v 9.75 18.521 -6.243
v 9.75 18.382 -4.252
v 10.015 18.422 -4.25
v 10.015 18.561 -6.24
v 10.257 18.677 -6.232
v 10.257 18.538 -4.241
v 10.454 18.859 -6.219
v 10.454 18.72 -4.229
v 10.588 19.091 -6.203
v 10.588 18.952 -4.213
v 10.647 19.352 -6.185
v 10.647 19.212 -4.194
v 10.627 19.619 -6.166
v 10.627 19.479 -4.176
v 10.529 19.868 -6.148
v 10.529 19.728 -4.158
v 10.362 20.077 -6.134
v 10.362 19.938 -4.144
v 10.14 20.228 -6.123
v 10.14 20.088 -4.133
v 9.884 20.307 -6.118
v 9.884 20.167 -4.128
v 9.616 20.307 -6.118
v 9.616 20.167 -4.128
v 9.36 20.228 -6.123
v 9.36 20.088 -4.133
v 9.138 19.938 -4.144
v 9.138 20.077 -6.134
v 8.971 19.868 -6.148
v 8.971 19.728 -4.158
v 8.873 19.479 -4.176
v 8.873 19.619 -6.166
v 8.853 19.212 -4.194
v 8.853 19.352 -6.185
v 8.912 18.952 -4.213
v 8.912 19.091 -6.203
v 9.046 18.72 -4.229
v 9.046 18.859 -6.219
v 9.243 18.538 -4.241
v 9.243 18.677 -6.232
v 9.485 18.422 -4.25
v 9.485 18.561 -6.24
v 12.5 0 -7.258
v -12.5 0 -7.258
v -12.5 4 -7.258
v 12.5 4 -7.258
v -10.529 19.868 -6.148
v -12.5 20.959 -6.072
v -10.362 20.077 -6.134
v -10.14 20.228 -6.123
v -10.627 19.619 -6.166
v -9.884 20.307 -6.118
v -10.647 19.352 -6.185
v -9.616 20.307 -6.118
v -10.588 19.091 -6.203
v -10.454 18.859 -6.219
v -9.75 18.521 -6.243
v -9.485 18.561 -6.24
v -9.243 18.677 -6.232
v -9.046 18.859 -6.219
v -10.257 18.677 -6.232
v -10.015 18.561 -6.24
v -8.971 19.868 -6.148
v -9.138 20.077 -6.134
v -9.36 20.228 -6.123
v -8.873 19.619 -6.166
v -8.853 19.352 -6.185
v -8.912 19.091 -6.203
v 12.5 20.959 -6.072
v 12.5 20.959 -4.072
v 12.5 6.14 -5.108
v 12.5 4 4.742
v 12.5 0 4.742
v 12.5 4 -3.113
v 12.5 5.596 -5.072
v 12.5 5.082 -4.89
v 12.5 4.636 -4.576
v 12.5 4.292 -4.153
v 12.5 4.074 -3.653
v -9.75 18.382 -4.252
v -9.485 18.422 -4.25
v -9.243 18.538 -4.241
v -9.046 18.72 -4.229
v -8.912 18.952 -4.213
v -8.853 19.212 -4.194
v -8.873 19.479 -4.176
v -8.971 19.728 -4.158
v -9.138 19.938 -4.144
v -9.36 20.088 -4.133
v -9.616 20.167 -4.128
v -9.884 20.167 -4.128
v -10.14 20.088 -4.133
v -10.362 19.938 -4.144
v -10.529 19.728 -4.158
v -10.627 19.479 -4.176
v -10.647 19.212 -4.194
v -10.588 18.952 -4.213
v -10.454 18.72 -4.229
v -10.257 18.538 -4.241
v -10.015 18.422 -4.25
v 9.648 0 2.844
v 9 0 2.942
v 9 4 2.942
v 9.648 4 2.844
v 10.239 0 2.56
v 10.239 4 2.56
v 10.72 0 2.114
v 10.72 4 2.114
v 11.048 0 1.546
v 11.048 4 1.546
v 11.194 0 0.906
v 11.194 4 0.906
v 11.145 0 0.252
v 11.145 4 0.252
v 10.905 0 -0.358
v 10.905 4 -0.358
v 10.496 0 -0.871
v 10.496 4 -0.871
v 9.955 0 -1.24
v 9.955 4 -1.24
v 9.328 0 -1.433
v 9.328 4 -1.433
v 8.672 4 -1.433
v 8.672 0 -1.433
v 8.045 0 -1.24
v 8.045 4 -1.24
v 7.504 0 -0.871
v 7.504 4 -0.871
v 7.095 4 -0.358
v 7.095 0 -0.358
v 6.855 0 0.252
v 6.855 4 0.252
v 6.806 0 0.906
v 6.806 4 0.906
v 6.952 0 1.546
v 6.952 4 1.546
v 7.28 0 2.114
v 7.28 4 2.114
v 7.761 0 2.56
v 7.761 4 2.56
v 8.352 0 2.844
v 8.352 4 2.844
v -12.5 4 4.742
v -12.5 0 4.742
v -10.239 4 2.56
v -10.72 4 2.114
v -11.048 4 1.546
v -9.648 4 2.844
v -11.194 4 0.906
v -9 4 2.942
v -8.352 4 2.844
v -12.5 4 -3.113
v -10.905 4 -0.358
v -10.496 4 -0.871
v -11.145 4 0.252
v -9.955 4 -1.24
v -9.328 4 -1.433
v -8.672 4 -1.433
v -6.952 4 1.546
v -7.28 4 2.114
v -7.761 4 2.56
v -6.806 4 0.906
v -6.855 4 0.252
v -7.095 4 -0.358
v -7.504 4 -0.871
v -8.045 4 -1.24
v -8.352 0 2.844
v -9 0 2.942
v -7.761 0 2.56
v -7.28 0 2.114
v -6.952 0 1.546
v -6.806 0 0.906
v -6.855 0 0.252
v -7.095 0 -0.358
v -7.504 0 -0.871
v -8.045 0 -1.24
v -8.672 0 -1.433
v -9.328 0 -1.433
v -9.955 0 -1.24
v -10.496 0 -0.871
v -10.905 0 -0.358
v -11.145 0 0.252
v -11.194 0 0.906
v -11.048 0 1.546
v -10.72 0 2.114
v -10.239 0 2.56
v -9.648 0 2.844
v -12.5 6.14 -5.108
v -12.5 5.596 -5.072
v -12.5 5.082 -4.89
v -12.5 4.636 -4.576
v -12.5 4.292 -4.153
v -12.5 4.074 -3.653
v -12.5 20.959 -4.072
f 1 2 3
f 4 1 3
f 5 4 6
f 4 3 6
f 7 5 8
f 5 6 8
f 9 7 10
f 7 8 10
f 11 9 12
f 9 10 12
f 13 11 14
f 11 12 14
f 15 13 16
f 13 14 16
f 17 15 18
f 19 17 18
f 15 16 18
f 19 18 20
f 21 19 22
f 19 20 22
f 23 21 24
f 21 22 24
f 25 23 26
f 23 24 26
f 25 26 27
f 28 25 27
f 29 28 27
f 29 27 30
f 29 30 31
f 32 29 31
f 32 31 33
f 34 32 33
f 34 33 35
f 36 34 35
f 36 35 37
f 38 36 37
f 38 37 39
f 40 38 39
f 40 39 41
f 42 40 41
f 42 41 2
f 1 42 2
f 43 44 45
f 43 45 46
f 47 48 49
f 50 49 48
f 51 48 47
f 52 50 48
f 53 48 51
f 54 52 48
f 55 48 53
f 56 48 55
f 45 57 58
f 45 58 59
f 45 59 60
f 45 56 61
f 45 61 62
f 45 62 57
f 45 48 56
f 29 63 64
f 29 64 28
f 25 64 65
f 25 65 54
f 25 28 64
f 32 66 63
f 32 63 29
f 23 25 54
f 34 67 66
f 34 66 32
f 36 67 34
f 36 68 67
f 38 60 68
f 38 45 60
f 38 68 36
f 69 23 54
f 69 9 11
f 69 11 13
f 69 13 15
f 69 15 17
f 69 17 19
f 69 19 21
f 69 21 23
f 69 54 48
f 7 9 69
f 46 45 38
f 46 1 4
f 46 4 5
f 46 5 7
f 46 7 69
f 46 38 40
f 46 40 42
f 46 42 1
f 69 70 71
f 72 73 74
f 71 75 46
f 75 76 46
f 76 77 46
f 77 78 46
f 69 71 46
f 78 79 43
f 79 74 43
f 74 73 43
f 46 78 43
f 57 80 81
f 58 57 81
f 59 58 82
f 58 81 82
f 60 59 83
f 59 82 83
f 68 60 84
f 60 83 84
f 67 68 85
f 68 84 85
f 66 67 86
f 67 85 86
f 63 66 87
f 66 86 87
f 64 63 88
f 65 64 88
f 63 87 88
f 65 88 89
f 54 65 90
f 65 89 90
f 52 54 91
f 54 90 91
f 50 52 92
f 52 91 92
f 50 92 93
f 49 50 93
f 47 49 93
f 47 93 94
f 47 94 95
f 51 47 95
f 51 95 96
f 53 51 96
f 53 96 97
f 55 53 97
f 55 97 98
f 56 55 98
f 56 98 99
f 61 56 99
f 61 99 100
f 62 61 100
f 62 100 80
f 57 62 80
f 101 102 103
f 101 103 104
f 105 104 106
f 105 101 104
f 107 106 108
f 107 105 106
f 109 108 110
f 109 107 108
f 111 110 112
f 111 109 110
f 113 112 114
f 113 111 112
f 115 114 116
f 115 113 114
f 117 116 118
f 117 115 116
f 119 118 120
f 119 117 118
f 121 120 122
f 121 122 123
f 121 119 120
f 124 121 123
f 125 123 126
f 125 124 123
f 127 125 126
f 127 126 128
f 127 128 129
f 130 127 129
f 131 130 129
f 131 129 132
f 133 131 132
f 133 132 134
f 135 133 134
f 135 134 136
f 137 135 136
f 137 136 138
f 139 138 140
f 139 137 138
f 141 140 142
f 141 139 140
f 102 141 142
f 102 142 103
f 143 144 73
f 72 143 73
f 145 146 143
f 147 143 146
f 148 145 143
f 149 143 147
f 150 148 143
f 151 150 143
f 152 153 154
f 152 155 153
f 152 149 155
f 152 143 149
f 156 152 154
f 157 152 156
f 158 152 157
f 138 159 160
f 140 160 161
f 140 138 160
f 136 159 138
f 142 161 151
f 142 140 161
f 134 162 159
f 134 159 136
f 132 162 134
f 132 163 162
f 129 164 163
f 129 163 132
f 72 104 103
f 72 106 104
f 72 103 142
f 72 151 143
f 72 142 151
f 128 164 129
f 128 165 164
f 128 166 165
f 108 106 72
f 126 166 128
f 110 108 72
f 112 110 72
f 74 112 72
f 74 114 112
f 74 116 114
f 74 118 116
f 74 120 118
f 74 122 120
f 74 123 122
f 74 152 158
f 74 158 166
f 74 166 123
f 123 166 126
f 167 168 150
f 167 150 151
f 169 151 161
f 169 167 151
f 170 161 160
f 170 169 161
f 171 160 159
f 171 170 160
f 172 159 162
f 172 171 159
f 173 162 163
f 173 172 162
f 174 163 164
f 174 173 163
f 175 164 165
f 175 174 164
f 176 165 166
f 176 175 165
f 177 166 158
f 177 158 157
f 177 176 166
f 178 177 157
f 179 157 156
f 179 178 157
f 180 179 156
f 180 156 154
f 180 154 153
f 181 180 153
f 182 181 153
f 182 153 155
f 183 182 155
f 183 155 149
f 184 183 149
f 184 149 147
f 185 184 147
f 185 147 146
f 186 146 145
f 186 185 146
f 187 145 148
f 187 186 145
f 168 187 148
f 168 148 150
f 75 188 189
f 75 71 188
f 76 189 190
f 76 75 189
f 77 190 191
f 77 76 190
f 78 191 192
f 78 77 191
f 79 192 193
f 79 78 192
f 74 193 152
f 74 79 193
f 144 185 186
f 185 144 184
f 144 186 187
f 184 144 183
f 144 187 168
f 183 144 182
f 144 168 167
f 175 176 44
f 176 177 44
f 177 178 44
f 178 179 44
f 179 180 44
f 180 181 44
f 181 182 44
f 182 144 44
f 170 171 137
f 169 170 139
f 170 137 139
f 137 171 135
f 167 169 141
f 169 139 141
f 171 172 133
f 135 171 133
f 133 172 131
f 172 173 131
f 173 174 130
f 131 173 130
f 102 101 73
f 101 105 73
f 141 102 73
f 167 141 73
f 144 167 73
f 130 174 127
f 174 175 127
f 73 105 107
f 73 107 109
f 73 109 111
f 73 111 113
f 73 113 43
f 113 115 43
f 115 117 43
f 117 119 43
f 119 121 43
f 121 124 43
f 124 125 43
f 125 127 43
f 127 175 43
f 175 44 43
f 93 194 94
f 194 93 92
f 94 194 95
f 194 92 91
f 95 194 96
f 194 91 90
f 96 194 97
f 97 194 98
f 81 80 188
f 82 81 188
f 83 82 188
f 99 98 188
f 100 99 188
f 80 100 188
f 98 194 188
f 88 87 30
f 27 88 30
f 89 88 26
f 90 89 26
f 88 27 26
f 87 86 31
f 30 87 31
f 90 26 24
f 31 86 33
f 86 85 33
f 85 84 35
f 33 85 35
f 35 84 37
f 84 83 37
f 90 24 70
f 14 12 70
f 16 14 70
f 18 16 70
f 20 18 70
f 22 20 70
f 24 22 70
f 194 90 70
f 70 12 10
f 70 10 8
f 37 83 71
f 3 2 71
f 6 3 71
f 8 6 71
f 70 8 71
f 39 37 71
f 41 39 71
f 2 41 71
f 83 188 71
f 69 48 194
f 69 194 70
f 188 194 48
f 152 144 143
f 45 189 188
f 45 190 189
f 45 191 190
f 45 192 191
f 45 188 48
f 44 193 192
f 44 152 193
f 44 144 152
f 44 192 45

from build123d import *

# Parameters (mm, degrees)
ESQUISSE1_W             = 25
ESQUISSE1_H             = 12
ESQUISSE1_R             = 2.2
BOSS_EXTRU_1_DEPTH      = 4
ESQUISSE5_W             = 25
ESQUISSE5_H             = 2
BOSS_EXTRU_2_DEPTH      = 17
ESQUISSE6_R             = 0.9
ENL_V_MAT_EXTRU_1_DEPTH = 17
CONG_2_R                = 2


with BuildPart() as part:
    # Esquisse1 → Boss.-Extru.1 (new body)
    with BuildSketch(Plane(origin=(0, 0, 0), x_dir=(1, 0, 0), z_dir=(0, 1, 0))):
        with Locations((0, 1.258064516)):
            Rectangle(ESQUISSE1_W, ESQUISSE1_H)
        with Locations(Location((9, -0.741935484, 0), (0, 0, 270))):
            Circle(ESQUISSE1_R, mode=Mode.SUBTRACT)
        with Locations(Location((-9, -0.741935484, 0), (0, 0, 270))):
            Circle(ESQUISSE1_R, mode=Mode.SUBTRACT)
    extrude(amount=BOSS_EXTRU_1_DEPTH)

    # Esquisse5 → Boss.-Extru.2 (add, along a direction that is not the sketch's normal)
    with BuildSketch(Plane(origin=(0, 4, 0), x_dir=(1, 0, 0), z_dir=(0, 1, 0))):
        with Locations((0, 6.258064516)):
            Rectangle(ESQUISSE5_W, ESQUISSE5_H)
    extrude(amount=BOSS_EXTRU_2_DEPTH, dir=(0, 0.9975640502598248, 0.06975647374411817))

    # Esquisse6 → Enlèv. mat.-Extru.1 (cut)
    with BuildSketch(Plane(origin=(0, 0.385354434, -5.510825157), x_dir=(1, 0, 0), z_dir=(0, -0.06975647374411817, 0.9975640502598248))):
        with Locations(Location((-9.75, 18.940348686, 0), (0, 0, 270))):
            Circle(ESQUISSE6_R)
        with Locations(Location((9.75, 18.940348686, 0), (0, 0, 270))):
            Circle(ESQUISSE6_R)
    extrude(amount=-ENL_V_MAT_EXTRU_1_DEPTH, mode=Mode.SUBTRACT)

    # Congé2
    cong_2_edges = [part.edges().sort_by_distance(p)[0] for p in [
        (0, 4, -5.258064516),
    ]]
    fillet(cong_2_edges, radius=CONG_2_R)


solid = part.part
